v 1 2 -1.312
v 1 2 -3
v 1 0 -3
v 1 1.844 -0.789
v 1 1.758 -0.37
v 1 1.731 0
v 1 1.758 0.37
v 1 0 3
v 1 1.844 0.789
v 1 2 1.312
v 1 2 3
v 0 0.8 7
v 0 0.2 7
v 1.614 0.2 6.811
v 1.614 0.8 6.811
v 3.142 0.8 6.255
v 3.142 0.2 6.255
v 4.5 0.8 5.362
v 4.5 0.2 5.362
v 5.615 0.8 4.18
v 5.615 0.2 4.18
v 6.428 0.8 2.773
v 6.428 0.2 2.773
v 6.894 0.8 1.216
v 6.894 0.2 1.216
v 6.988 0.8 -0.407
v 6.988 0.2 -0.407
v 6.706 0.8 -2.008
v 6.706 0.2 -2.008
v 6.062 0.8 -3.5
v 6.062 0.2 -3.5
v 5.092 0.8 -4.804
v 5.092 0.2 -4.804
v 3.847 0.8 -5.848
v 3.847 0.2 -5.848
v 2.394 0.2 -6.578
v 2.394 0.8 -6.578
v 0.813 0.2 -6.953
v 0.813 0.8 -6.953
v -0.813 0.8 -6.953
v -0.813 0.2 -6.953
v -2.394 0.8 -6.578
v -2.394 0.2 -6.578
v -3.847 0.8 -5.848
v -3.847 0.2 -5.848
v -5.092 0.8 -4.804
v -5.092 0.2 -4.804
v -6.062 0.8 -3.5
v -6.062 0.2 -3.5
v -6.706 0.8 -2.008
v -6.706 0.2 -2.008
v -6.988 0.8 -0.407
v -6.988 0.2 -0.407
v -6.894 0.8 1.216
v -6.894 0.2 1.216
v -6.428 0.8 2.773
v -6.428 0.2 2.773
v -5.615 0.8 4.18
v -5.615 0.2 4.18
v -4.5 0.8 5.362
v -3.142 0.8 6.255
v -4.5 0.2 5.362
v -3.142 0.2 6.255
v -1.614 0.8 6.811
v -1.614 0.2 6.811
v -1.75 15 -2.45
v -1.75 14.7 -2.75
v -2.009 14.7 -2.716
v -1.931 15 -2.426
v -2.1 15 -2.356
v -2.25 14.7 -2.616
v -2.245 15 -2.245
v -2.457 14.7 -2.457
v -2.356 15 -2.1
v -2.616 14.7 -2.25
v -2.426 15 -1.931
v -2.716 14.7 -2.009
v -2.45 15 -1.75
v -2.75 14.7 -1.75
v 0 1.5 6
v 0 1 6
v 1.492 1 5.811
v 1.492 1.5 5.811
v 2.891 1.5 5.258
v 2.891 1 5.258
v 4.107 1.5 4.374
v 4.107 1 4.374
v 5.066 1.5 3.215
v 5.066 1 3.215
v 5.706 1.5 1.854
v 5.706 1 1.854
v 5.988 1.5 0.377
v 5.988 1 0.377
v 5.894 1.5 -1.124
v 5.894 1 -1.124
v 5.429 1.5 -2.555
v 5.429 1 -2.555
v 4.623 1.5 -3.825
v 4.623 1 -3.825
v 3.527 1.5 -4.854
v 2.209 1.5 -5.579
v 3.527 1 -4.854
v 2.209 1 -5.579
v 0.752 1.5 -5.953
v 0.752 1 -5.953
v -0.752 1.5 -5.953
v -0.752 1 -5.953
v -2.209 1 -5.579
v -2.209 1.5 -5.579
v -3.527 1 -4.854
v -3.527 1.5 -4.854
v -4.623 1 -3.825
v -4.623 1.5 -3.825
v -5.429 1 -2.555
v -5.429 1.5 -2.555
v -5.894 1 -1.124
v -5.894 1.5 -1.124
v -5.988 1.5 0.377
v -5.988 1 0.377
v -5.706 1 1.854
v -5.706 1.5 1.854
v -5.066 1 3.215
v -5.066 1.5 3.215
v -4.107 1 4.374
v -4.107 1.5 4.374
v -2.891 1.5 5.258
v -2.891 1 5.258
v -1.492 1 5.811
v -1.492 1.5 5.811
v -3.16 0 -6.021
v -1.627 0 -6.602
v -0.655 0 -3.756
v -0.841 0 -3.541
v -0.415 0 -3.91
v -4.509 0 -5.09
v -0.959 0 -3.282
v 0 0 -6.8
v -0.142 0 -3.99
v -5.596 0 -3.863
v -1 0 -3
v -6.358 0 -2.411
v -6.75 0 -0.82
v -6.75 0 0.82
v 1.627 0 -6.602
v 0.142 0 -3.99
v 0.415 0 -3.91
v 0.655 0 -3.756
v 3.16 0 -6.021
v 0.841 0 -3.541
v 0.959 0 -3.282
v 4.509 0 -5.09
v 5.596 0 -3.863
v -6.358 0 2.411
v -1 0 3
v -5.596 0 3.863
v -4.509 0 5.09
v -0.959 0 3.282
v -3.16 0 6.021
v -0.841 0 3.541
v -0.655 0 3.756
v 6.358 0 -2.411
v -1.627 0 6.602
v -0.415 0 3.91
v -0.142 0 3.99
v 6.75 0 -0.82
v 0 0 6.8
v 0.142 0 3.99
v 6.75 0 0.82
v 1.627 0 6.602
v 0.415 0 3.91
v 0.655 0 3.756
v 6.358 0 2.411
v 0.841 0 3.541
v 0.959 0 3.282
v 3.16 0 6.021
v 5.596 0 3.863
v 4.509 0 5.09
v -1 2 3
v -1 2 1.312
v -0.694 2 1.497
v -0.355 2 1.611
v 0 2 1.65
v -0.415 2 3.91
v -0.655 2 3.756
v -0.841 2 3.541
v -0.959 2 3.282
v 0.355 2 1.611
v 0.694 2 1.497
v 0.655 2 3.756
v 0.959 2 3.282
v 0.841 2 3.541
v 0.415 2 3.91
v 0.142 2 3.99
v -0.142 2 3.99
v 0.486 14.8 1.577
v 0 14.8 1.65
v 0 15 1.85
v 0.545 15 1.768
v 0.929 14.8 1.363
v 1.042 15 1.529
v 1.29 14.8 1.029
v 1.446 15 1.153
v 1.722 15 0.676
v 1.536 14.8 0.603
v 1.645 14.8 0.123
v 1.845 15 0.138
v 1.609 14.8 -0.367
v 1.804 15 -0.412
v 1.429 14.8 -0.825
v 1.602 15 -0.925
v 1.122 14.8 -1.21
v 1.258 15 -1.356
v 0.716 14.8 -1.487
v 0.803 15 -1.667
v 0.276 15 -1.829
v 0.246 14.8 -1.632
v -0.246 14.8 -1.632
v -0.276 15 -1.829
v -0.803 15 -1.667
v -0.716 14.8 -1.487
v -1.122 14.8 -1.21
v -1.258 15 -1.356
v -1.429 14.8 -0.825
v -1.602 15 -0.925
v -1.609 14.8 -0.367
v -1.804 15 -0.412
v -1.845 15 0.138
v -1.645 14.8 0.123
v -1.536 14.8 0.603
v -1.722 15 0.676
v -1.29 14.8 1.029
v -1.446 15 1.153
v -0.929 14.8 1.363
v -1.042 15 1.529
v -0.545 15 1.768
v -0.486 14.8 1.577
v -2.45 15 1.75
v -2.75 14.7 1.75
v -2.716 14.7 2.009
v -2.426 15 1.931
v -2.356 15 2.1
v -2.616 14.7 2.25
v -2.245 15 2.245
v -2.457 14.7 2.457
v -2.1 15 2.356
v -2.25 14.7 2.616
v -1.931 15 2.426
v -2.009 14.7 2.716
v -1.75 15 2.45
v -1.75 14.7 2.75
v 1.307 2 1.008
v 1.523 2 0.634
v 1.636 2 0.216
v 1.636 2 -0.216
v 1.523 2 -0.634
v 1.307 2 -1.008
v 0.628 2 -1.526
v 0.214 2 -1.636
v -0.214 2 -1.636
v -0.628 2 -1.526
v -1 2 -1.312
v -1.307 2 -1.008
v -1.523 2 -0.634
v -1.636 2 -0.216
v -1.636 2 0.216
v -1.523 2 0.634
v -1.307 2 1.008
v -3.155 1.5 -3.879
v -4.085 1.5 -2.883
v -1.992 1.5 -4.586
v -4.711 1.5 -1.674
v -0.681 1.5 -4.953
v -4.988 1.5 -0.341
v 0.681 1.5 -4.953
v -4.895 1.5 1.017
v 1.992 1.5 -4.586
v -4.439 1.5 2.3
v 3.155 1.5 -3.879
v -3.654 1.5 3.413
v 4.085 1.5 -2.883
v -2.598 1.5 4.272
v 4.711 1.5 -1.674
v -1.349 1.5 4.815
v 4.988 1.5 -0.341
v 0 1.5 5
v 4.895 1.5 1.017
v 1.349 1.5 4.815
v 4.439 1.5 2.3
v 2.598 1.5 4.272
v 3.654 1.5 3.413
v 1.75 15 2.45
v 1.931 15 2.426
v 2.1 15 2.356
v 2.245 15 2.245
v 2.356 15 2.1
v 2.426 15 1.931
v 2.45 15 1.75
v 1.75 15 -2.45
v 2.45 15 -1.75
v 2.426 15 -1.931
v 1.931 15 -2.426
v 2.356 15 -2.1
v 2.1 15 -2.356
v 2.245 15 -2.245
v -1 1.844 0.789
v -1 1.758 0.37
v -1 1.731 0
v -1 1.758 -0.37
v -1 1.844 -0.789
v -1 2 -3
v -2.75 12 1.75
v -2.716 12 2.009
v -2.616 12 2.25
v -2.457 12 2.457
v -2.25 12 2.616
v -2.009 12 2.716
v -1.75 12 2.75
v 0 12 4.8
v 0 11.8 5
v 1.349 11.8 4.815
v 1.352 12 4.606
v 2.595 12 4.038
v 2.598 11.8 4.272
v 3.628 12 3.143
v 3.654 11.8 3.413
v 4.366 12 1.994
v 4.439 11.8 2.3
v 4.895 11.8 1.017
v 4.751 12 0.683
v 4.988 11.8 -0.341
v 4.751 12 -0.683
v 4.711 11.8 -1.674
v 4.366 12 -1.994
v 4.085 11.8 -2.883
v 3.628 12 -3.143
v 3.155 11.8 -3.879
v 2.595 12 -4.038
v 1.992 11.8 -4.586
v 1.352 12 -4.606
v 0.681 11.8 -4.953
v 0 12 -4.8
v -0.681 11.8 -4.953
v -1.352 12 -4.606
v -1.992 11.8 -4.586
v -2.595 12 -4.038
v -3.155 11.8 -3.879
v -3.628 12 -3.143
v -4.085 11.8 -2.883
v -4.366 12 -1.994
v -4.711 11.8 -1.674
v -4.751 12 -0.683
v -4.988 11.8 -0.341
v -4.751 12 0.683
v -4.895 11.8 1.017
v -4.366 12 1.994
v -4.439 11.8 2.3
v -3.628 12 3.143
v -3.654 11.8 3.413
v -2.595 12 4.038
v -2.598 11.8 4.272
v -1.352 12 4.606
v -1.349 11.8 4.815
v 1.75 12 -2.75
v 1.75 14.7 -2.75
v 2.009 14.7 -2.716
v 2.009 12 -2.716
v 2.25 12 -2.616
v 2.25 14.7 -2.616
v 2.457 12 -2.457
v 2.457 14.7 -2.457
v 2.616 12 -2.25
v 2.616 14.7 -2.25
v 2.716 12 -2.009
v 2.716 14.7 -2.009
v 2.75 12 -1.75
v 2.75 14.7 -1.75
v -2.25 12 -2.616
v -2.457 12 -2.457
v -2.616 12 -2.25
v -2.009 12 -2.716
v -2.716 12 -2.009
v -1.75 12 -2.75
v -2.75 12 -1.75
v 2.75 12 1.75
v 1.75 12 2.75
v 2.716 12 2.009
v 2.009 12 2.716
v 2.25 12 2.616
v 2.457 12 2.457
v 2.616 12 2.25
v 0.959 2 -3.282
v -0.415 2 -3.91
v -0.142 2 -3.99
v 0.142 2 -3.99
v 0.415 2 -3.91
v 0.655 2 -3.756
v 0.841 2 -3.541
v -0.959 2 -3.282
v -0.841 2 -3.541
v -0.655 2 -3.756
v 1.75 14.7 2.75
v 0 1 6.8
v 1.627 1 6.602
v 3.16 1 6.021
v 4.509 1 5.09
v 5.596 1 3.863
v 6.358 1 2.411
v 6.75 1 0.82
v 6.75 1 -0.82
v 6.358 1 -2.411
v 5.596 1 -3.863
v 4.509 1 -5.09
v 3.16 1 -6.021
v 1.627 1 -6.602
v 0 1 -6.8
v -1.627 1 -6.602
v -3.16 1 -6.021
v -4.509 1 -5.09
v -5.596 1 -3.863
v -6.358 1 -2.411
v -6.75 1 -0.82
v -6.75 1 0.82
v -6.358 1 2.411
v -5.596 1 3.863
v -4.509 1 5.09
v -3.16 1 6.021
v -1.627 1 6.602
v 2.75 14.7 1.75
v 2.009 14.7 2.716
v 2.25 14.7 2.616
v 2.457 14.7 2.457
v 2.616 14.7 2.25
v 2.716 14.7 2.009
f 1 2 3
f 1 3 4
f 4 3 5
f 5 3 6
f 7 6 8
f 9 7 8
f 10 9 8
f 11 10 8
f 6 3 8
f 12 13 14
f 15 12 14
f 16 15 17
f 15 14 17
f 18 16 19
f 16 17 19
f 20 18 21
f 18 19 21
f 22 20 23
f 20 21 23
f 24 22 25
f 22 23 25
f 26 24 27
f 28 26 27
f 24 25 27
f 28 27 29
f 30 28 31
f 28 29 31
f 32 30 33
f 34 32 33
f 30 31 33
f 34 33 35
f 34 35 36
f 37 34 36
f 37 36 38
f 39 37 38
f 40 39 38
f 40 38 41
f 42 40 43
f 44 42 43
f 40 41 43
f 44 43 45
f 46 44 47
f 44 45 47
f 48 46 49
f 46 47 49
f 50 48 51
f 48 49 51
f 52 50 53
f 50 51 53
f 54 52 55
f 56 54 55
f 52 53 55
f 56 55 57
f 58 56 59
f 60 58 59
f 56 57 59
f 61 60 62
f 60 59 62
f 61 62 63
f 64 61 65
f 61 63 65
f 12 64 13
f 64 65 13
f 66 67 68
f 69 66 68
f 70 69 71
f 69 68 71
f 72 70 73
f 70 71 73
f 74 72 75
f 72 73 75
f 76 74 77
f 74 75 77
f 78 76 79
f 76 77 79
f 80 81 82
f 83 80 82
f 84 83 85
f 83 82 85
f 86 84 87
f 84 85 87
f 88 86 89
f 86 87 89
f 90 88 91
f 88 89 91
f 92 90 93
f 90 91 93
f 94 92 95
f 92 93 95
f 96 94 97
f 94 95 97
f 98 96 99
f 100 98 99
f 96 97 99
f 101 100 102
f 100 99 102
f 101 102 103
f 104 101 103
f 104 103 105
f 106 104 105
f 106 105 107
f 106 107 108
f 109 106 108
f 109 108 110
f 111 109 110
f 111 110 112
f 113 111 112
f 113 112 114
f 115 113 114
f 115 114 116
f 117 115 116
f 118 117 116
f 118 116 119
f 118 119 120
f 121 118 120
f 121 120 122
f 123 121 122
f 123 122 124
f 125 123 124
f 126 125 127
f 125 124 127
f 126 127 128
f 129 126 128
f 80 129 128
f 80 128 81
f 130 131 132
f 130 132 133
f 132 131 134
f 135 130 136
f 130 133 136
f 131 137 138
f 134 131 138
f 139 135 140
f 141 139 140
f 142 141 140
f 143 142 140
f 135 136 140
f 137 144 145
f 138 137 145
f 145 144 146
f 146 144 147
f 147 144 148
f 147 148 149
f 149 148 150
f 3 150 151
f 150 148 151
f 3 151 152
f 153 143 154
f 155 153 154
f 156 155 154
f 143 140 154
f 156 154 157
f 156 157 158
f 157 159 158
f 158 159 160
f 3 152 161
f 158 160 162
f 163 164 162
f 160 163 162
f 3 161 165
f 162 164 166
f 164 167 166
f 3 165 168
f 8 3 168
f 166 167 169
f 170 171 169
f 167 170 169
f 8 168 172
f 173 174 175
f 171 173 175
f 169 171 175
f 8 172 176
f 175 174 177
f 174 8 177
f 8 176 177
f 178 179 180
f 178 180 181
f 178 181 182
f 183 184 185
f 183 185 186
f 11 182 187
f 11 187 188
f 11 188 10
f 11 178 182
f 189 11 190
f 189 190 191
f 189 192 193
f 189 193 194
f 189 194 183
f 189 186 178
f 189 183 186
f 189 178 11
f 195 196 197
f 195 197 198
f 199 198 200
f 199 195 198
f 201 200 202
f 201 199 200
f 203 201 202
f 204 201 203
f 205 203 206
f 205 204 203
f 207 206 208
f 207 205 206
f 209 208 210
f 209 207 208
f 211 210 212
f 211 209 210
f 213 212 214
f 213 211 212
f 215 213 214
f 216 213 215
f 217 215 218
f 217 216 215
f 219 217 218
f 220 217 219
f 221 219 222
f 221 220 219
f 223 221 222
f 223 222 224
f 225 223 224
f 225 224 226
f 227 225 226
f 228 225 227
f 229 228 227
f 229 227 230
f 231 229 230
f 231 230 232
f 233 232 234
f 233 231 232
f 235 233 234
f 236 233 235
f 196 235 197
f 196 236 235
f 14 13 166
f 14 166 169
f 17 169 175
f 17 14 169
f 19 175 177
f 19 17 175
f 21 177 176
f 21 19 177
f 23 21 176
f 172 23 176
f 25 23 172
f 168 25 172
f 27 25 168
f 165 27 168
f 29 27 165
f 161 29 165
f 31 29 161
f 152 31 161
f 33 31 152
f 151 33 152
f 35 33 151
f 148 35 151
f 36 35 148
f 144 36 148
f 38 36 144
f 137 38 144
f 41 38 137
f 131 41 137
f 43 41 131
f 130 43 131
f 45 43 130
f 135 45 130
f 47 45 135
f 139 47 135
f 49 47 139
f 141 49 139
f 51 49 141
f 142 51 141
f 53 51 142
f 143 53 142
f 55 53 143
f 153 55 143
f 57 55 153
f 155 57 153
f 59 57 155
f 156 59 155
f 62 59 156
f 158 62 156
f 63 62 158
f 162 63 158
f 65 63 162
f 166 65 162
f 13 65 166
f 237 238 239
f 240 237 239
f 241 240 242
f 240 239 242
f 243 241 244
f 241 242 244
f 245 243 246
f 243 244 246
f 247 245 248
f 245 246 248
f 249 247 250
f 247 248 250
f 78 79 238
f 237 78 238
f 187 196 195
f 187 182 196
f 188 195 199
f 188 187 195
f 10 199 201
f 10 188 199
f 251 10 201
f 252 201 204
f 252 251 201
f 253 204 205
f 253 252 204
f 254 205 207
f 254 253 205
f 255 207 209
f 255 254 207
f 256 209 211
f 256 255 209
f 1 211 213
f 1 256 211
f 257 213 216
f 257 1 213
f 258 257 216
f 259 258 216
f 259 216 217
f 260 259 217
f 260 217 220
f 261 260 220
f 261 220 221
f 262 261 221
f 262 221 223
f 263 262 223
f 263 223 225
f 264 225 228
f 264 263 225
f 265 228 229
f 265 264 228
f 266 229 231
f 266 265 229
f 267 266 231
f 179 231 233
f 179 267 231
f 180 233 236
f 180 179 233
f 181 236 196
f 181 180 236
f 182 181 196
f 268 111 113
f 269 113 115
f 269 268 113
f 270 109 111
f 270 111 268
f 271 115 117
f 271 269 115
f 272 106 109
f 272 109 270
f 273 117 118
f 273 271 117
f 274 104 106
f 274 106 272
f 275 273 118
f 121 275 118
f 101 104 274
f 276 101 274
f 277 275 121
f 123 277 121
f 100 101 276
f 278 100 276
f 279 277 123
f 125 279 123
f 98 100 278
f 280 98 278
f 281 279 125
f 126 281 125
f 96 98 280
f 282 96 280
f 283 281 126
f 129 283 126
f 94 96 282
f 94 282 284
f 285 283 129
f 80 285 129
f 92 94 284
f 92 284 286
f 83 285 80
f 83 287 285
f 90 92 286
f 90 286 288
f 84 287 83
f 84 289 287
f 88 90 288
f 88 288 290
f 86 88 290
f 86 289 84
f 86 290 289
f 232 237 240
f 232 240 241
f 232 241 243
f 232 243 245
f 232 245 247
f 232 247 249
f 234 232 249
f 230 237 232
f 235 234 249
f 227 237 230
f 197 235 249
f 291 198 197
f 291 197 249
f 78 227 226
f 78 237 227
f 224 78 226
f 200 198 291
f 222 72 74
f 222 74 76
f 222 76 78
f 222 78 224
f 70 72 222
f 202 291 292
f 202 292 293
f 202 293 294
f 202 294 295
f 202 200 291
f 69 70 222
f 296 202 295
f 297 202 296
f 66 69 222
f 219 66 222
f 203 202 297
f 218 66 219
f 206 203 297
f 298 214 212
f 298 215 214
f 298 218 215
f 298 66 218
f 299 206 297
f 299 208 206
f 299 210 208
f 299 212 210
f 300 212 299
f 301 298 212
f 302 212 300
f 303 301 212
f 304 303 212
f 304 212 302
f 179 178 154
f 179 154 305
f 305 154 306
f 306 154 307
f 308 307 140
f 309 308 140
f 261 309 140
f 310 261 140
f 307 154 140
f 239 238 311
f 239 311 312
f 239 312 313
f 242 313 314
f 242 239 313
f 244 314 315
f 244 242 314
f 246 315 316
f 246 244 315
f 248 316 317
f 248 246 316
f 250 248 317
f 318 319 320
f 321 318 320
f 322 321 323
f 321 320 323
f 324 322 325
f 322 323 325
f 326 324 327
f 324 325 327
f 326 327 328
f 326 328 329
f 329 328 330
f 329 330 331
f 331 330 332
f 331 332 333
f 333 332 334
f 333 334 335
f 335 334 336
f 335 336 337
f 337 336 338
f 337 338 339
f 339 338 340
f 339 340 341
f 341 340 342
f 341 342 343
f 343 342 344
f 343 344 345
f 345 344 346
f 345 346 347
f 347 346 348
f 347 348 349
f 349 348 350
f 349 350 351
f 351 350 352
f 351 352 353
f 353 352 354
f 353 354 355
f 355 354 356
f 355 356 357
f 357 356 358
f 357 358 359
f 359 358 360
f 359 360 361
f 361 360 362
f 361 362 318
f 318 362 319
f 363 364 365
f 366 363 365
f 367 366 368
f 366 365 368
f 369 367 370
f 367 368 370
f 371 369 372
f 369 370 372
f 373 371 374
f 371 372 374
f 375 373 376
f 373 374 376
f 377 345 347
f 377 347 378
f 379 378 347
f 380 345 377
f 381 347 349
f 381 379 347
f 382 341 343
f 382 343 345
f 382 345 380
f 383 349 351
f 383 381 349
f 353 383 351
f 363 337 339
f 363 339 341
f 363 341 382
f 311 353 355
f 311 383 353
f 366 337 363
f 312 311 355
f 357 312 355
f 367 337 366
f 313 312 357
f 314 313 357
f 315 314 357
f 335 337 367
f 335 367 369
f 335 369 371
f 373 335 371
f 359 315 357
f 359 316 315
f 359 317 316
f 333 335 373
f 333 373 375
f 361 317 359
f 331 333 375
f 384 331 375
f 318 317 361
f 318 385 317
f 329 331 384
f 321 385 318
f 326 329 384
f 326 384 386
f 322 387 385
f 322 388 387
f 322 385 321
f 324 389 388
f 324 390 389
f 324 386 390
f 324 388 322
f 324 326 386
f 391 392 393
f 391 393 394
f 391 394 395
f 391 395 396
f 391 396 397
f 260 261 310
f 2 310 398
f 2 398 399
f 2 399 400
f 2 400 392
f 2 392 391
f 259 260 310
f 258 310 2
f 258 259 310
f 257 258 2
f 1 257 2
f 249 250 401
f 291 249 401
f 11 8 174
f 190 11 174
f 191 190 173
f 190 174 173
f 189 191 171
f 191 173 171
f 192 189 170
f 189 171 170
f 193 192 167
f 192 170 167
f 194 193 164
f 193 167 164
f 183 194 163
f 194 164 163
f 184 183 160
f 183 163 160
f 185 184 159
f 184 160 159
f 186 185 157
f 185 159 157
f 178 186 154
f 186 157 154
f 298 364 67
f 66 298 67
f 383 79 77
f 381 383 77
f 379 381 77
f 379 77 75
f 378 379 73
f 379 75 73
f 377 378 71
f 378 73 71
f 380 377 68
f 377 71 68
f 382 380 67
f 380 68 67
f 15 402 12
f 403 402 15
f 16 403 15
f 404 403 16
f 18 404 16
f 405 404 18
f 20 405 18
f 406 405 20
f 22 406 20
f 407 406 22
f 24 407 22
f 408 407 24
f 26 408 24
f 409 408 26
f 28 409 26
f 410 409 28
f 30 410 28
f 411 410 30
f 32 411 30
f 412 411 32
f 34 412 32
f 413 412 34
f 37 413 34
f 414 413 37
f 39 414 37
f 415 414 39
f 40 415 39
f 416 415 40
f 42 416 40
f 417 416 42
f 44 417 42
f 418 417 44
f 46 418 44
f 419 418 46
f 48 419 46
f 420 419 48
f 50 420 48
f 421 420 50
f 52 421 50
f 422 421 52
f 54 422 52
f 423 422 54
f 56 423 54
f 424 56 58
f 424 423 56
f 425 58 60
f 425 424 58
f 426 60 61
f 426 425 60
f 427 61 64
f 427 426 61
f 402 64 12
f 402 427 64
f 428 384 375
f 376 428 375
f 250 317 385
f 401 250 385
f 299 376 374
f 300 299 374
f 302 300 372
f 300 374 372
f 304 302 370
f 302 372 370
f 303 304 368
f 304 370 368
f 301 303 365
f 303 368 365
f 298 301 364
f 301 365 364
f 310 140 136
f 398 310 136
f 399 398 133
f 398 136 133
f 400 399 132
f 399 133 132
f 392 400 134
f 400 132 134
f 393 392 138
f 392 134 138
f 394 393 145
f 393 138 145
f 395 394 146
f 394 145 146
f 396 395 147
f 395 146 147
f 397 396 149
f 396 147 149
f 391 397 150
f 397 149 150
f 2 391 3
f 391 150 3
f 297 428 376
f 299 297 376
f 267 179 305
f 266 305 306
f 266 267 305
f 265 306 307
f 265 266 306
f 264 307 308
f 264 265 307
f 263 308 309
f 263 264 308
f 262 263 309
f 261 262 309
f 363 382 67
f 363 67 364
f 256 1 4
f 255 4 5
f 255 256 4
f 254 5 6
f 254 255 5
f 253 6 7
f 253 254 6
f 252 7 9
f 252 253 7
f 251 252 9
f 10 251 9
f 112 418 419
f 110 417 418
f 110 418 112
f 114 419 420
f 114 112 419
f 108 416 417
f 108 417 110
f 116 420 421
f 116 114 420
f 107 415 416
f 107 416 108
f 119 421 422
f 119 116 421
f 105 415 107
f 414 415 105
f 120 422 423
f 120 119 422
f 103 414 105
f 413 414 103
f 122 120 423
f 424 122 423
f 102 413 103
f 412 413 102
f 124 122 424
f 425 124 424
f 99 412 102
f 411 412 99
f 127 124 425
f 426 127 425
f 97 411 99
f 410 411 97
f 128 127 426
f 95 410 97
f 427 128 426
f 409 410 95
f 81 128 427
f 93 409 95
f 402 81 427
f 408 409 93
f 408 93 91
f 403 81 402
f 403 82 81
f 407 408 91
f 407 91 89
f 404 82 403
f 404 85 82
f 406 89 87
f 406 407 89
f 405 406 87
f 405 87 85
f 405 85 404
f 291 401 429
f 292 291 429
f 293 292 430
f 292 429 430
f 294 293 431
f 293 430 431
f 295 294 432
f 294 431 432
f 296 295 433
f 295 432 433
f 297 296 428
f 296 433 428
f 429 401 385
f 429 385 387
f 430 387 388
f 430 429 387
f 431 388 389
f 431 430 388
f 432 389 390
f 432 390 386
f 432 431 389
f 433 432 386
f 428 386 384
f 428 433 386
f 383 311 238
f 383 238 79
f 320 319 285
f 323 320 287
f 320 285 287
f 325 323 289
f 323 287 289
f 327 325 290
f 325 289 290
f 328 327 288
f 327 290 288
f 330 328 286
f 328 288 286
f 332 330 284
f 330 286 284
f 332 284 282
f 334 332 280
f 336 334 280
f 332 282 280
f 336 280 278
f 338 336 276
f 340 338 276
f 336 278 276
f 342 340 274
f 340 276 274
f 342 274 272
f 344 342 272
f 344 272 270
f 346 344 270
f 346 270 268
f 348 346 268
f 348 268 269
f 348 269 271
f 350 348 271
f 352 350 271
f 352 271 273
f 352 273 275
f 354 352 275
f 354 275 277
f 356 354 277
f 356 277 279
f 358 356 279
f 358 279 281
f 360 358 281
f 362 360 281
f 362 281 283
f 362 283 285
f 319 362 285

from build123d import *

# Parameters (mm, degrees)
SKETCH_1_R          = 7
SKETCH_1_R_2        = 1.65
EXTRUDE_1_DEPTH     = 1
SKETCH_1_4_R        = 6
SKETCH_1_4_R_2      = 1.65
EXTRUDE_2_DEPTH     = 1.5
SKETCH_1_5_R        = 5
SKETCH_1_5_R_2      = 1.65
EXTRUDE_3_DEPTH     = 12
EXTRUDE_START       = 2
SKETCH_1_6_R        = 4.25
SKETCH_1_6_W        = 5.5
SKETCH_1_6_H        = 5.5
EXTRUDE_4_DEPTH     = 10
SKETCH_1_7_W        = 5.5
SKETCH_1_7_H        = 5.5
SKETCH_1_7_R        = 1.65
EXTRUDE_5_DEPTH     = 13
SKETCH_1_8_R        = 1.65
EXTRUDE_6_DEPTH     = 2
CUT_EXTRUDE_1_DEPTH = 2
FILLET_1_R          = 1
CHAMFER_1_SIZE      = 0.2
CHAMFER_2_SIZE      = 0.3


with BuildPart() as part:
    # 스케치1 → 보스-돌출1 (new body)
    with BuildSketch(Plane(origin=(0, 0, 0), x_dir=(1, 0, 0), z_dir=(0, 1, 0))):
        Circle(SKETCH_1_R)
        Circle(SKETCH_1_R_2, mode=Mode.SUBTRACT)
    extrude(amount=EXTRUDE_1_DEPTH)

    # 스케치1<4> → 보스-돌출2 (add)
    with BuildSketch(Plane(origin=(0, 0, 0), x_dir=(1, 0, 0), z_dir=(0, 1, 0))):
        Circle(SKETCH_1_4_R)
        Circle(SKETCH_1_4_R_2, mode=Mode.SUBTRACT)
    extrude(amount=EXTRUDE_2_DEPTH)

    # 스케치1<5> → 보스-돌출3 (add)
    with BuildSketch(Plane(origin=(0, 0, 0), x_dir=(1, 0, 0), z_dir=(0, 1, 0))):
        Circle(SKETCH_1_5_R)
        Circle(SKETCH_1_5_R_2, mode=Mode.SUBTRACT)
    extrude(amount=EXTRUDE_3_DEPTH)

    # 스케치1<6> → 보스-돌출4 (add)
    with BuildSketch(Plane(origin=(0, 0, 0), x_dir=(1, 0, 0), z_dir=(0, 1, 0)).offset(EXTRUDE_START)):
        Circle(SKETCH_1_6_R)
        Rectangle(SKETCH_1_6_W, SKETCH_1_6_H, mode=Mode.SUBTRACT)
    extrude(amount=EXTRUDE_4_DEPTH)

    # 스케치1<7> → 보스-돌출5 (add)
    with BuildSketch(Plane(origin=(0, 0, 0), x_dir=(1, 0, 0), z_dir=(0, 1, 0)).offset(EXTRUDE_START)):
        Rectangle(SKETCH_1_7_W, SKETCH_1_7_H)
        Circle(SKETCH_1_7_R, mode=Mode.SUBTRACT)
    extrude(amount=EXTRUDE_5_DEPTH)

    # 스케치1<8> → 보스-돌출6 (add)
    with BuildSketch(Plane(origin=(0, 0, 0), x_dir=(1, 0, 0), z_dir=(0, 1, 0))):
        Circle(SKETCH_1_8_R)
    extrude(amount=EXTRUDE_6_DEPTH)

    # 스케치2 → 컷-돌출1 (cut)
    with BuildSketch(Plane.XZ):
        with BuildLine():
            ThreePointArc((-1, -3), (0, -4), (1, -3))
            Line((1, -3), (1, 3))
            ThreePointArc((1, 3), (0, 4), (-1, 3))
            Line((-1, 3), (-1, -3))
        make_face()
    extrude(amount=-CUT_EXTRUDE_1_DEPTH, mode=Mode.SUBTRACT)

    # 필렛1
    fillet_1_edges = [part.edges().sort_by_distance(p)[0] for p in [
        (2.75, 13.5, 2.75),
        (2.75, 13.5, -2.75),
        (-2.75, 13.5, -2.75),
        (-2.75, 13.5, 2.75),
    ]]
    fillet(fillet_1_edges, radius=FILLET_1_R)

    # 모따기1
    chamfer_1_edges = [part.edges().sort_by_distance(p)[0] for p in [
        (-5, 12, 0),
        (-7, 1, 0),
        (-7, 0, 0),
        (-1.65, 15, 0),
    ]]
    chamfer(chamfer_1_edges, length=CHAMFER_1_SIZE)

    # 모따기2
    chamfer_2_edges = [part.edges().sort_by_distance(p)[0] for p in [
        (2.75, 15, 0),
        (0, 15, 2.75),
        (-2.75, 15, 0),
        (0, 15, -2.75),
        (-2.457106781, 15, 2.457106781),
        (2.457106781, 15, 2.457106781),
        (-2.457106781, 15, -2.457106781),
        (2.457106781, 15, -2.457106781),
    ]]
    chamfer(chamfer_2_edges, length=CHAMFER_2_SIZE)

    # 스케치3 → 컷-회전1 (revolve, cut)
    with BuildSketch(Plane(origin=(0, 0, 0), x_dir=(0, 0, -1), z_dir=(1, 0, 0))):
        Polygon((0, 1.316547622), (0, 2), (-1.65, 2), align=None)
    revolve(axis=Axis((0, 11.8, 0), (0, -1, 0)), mode=Mode.SUBTRACT)


solid = part.part
